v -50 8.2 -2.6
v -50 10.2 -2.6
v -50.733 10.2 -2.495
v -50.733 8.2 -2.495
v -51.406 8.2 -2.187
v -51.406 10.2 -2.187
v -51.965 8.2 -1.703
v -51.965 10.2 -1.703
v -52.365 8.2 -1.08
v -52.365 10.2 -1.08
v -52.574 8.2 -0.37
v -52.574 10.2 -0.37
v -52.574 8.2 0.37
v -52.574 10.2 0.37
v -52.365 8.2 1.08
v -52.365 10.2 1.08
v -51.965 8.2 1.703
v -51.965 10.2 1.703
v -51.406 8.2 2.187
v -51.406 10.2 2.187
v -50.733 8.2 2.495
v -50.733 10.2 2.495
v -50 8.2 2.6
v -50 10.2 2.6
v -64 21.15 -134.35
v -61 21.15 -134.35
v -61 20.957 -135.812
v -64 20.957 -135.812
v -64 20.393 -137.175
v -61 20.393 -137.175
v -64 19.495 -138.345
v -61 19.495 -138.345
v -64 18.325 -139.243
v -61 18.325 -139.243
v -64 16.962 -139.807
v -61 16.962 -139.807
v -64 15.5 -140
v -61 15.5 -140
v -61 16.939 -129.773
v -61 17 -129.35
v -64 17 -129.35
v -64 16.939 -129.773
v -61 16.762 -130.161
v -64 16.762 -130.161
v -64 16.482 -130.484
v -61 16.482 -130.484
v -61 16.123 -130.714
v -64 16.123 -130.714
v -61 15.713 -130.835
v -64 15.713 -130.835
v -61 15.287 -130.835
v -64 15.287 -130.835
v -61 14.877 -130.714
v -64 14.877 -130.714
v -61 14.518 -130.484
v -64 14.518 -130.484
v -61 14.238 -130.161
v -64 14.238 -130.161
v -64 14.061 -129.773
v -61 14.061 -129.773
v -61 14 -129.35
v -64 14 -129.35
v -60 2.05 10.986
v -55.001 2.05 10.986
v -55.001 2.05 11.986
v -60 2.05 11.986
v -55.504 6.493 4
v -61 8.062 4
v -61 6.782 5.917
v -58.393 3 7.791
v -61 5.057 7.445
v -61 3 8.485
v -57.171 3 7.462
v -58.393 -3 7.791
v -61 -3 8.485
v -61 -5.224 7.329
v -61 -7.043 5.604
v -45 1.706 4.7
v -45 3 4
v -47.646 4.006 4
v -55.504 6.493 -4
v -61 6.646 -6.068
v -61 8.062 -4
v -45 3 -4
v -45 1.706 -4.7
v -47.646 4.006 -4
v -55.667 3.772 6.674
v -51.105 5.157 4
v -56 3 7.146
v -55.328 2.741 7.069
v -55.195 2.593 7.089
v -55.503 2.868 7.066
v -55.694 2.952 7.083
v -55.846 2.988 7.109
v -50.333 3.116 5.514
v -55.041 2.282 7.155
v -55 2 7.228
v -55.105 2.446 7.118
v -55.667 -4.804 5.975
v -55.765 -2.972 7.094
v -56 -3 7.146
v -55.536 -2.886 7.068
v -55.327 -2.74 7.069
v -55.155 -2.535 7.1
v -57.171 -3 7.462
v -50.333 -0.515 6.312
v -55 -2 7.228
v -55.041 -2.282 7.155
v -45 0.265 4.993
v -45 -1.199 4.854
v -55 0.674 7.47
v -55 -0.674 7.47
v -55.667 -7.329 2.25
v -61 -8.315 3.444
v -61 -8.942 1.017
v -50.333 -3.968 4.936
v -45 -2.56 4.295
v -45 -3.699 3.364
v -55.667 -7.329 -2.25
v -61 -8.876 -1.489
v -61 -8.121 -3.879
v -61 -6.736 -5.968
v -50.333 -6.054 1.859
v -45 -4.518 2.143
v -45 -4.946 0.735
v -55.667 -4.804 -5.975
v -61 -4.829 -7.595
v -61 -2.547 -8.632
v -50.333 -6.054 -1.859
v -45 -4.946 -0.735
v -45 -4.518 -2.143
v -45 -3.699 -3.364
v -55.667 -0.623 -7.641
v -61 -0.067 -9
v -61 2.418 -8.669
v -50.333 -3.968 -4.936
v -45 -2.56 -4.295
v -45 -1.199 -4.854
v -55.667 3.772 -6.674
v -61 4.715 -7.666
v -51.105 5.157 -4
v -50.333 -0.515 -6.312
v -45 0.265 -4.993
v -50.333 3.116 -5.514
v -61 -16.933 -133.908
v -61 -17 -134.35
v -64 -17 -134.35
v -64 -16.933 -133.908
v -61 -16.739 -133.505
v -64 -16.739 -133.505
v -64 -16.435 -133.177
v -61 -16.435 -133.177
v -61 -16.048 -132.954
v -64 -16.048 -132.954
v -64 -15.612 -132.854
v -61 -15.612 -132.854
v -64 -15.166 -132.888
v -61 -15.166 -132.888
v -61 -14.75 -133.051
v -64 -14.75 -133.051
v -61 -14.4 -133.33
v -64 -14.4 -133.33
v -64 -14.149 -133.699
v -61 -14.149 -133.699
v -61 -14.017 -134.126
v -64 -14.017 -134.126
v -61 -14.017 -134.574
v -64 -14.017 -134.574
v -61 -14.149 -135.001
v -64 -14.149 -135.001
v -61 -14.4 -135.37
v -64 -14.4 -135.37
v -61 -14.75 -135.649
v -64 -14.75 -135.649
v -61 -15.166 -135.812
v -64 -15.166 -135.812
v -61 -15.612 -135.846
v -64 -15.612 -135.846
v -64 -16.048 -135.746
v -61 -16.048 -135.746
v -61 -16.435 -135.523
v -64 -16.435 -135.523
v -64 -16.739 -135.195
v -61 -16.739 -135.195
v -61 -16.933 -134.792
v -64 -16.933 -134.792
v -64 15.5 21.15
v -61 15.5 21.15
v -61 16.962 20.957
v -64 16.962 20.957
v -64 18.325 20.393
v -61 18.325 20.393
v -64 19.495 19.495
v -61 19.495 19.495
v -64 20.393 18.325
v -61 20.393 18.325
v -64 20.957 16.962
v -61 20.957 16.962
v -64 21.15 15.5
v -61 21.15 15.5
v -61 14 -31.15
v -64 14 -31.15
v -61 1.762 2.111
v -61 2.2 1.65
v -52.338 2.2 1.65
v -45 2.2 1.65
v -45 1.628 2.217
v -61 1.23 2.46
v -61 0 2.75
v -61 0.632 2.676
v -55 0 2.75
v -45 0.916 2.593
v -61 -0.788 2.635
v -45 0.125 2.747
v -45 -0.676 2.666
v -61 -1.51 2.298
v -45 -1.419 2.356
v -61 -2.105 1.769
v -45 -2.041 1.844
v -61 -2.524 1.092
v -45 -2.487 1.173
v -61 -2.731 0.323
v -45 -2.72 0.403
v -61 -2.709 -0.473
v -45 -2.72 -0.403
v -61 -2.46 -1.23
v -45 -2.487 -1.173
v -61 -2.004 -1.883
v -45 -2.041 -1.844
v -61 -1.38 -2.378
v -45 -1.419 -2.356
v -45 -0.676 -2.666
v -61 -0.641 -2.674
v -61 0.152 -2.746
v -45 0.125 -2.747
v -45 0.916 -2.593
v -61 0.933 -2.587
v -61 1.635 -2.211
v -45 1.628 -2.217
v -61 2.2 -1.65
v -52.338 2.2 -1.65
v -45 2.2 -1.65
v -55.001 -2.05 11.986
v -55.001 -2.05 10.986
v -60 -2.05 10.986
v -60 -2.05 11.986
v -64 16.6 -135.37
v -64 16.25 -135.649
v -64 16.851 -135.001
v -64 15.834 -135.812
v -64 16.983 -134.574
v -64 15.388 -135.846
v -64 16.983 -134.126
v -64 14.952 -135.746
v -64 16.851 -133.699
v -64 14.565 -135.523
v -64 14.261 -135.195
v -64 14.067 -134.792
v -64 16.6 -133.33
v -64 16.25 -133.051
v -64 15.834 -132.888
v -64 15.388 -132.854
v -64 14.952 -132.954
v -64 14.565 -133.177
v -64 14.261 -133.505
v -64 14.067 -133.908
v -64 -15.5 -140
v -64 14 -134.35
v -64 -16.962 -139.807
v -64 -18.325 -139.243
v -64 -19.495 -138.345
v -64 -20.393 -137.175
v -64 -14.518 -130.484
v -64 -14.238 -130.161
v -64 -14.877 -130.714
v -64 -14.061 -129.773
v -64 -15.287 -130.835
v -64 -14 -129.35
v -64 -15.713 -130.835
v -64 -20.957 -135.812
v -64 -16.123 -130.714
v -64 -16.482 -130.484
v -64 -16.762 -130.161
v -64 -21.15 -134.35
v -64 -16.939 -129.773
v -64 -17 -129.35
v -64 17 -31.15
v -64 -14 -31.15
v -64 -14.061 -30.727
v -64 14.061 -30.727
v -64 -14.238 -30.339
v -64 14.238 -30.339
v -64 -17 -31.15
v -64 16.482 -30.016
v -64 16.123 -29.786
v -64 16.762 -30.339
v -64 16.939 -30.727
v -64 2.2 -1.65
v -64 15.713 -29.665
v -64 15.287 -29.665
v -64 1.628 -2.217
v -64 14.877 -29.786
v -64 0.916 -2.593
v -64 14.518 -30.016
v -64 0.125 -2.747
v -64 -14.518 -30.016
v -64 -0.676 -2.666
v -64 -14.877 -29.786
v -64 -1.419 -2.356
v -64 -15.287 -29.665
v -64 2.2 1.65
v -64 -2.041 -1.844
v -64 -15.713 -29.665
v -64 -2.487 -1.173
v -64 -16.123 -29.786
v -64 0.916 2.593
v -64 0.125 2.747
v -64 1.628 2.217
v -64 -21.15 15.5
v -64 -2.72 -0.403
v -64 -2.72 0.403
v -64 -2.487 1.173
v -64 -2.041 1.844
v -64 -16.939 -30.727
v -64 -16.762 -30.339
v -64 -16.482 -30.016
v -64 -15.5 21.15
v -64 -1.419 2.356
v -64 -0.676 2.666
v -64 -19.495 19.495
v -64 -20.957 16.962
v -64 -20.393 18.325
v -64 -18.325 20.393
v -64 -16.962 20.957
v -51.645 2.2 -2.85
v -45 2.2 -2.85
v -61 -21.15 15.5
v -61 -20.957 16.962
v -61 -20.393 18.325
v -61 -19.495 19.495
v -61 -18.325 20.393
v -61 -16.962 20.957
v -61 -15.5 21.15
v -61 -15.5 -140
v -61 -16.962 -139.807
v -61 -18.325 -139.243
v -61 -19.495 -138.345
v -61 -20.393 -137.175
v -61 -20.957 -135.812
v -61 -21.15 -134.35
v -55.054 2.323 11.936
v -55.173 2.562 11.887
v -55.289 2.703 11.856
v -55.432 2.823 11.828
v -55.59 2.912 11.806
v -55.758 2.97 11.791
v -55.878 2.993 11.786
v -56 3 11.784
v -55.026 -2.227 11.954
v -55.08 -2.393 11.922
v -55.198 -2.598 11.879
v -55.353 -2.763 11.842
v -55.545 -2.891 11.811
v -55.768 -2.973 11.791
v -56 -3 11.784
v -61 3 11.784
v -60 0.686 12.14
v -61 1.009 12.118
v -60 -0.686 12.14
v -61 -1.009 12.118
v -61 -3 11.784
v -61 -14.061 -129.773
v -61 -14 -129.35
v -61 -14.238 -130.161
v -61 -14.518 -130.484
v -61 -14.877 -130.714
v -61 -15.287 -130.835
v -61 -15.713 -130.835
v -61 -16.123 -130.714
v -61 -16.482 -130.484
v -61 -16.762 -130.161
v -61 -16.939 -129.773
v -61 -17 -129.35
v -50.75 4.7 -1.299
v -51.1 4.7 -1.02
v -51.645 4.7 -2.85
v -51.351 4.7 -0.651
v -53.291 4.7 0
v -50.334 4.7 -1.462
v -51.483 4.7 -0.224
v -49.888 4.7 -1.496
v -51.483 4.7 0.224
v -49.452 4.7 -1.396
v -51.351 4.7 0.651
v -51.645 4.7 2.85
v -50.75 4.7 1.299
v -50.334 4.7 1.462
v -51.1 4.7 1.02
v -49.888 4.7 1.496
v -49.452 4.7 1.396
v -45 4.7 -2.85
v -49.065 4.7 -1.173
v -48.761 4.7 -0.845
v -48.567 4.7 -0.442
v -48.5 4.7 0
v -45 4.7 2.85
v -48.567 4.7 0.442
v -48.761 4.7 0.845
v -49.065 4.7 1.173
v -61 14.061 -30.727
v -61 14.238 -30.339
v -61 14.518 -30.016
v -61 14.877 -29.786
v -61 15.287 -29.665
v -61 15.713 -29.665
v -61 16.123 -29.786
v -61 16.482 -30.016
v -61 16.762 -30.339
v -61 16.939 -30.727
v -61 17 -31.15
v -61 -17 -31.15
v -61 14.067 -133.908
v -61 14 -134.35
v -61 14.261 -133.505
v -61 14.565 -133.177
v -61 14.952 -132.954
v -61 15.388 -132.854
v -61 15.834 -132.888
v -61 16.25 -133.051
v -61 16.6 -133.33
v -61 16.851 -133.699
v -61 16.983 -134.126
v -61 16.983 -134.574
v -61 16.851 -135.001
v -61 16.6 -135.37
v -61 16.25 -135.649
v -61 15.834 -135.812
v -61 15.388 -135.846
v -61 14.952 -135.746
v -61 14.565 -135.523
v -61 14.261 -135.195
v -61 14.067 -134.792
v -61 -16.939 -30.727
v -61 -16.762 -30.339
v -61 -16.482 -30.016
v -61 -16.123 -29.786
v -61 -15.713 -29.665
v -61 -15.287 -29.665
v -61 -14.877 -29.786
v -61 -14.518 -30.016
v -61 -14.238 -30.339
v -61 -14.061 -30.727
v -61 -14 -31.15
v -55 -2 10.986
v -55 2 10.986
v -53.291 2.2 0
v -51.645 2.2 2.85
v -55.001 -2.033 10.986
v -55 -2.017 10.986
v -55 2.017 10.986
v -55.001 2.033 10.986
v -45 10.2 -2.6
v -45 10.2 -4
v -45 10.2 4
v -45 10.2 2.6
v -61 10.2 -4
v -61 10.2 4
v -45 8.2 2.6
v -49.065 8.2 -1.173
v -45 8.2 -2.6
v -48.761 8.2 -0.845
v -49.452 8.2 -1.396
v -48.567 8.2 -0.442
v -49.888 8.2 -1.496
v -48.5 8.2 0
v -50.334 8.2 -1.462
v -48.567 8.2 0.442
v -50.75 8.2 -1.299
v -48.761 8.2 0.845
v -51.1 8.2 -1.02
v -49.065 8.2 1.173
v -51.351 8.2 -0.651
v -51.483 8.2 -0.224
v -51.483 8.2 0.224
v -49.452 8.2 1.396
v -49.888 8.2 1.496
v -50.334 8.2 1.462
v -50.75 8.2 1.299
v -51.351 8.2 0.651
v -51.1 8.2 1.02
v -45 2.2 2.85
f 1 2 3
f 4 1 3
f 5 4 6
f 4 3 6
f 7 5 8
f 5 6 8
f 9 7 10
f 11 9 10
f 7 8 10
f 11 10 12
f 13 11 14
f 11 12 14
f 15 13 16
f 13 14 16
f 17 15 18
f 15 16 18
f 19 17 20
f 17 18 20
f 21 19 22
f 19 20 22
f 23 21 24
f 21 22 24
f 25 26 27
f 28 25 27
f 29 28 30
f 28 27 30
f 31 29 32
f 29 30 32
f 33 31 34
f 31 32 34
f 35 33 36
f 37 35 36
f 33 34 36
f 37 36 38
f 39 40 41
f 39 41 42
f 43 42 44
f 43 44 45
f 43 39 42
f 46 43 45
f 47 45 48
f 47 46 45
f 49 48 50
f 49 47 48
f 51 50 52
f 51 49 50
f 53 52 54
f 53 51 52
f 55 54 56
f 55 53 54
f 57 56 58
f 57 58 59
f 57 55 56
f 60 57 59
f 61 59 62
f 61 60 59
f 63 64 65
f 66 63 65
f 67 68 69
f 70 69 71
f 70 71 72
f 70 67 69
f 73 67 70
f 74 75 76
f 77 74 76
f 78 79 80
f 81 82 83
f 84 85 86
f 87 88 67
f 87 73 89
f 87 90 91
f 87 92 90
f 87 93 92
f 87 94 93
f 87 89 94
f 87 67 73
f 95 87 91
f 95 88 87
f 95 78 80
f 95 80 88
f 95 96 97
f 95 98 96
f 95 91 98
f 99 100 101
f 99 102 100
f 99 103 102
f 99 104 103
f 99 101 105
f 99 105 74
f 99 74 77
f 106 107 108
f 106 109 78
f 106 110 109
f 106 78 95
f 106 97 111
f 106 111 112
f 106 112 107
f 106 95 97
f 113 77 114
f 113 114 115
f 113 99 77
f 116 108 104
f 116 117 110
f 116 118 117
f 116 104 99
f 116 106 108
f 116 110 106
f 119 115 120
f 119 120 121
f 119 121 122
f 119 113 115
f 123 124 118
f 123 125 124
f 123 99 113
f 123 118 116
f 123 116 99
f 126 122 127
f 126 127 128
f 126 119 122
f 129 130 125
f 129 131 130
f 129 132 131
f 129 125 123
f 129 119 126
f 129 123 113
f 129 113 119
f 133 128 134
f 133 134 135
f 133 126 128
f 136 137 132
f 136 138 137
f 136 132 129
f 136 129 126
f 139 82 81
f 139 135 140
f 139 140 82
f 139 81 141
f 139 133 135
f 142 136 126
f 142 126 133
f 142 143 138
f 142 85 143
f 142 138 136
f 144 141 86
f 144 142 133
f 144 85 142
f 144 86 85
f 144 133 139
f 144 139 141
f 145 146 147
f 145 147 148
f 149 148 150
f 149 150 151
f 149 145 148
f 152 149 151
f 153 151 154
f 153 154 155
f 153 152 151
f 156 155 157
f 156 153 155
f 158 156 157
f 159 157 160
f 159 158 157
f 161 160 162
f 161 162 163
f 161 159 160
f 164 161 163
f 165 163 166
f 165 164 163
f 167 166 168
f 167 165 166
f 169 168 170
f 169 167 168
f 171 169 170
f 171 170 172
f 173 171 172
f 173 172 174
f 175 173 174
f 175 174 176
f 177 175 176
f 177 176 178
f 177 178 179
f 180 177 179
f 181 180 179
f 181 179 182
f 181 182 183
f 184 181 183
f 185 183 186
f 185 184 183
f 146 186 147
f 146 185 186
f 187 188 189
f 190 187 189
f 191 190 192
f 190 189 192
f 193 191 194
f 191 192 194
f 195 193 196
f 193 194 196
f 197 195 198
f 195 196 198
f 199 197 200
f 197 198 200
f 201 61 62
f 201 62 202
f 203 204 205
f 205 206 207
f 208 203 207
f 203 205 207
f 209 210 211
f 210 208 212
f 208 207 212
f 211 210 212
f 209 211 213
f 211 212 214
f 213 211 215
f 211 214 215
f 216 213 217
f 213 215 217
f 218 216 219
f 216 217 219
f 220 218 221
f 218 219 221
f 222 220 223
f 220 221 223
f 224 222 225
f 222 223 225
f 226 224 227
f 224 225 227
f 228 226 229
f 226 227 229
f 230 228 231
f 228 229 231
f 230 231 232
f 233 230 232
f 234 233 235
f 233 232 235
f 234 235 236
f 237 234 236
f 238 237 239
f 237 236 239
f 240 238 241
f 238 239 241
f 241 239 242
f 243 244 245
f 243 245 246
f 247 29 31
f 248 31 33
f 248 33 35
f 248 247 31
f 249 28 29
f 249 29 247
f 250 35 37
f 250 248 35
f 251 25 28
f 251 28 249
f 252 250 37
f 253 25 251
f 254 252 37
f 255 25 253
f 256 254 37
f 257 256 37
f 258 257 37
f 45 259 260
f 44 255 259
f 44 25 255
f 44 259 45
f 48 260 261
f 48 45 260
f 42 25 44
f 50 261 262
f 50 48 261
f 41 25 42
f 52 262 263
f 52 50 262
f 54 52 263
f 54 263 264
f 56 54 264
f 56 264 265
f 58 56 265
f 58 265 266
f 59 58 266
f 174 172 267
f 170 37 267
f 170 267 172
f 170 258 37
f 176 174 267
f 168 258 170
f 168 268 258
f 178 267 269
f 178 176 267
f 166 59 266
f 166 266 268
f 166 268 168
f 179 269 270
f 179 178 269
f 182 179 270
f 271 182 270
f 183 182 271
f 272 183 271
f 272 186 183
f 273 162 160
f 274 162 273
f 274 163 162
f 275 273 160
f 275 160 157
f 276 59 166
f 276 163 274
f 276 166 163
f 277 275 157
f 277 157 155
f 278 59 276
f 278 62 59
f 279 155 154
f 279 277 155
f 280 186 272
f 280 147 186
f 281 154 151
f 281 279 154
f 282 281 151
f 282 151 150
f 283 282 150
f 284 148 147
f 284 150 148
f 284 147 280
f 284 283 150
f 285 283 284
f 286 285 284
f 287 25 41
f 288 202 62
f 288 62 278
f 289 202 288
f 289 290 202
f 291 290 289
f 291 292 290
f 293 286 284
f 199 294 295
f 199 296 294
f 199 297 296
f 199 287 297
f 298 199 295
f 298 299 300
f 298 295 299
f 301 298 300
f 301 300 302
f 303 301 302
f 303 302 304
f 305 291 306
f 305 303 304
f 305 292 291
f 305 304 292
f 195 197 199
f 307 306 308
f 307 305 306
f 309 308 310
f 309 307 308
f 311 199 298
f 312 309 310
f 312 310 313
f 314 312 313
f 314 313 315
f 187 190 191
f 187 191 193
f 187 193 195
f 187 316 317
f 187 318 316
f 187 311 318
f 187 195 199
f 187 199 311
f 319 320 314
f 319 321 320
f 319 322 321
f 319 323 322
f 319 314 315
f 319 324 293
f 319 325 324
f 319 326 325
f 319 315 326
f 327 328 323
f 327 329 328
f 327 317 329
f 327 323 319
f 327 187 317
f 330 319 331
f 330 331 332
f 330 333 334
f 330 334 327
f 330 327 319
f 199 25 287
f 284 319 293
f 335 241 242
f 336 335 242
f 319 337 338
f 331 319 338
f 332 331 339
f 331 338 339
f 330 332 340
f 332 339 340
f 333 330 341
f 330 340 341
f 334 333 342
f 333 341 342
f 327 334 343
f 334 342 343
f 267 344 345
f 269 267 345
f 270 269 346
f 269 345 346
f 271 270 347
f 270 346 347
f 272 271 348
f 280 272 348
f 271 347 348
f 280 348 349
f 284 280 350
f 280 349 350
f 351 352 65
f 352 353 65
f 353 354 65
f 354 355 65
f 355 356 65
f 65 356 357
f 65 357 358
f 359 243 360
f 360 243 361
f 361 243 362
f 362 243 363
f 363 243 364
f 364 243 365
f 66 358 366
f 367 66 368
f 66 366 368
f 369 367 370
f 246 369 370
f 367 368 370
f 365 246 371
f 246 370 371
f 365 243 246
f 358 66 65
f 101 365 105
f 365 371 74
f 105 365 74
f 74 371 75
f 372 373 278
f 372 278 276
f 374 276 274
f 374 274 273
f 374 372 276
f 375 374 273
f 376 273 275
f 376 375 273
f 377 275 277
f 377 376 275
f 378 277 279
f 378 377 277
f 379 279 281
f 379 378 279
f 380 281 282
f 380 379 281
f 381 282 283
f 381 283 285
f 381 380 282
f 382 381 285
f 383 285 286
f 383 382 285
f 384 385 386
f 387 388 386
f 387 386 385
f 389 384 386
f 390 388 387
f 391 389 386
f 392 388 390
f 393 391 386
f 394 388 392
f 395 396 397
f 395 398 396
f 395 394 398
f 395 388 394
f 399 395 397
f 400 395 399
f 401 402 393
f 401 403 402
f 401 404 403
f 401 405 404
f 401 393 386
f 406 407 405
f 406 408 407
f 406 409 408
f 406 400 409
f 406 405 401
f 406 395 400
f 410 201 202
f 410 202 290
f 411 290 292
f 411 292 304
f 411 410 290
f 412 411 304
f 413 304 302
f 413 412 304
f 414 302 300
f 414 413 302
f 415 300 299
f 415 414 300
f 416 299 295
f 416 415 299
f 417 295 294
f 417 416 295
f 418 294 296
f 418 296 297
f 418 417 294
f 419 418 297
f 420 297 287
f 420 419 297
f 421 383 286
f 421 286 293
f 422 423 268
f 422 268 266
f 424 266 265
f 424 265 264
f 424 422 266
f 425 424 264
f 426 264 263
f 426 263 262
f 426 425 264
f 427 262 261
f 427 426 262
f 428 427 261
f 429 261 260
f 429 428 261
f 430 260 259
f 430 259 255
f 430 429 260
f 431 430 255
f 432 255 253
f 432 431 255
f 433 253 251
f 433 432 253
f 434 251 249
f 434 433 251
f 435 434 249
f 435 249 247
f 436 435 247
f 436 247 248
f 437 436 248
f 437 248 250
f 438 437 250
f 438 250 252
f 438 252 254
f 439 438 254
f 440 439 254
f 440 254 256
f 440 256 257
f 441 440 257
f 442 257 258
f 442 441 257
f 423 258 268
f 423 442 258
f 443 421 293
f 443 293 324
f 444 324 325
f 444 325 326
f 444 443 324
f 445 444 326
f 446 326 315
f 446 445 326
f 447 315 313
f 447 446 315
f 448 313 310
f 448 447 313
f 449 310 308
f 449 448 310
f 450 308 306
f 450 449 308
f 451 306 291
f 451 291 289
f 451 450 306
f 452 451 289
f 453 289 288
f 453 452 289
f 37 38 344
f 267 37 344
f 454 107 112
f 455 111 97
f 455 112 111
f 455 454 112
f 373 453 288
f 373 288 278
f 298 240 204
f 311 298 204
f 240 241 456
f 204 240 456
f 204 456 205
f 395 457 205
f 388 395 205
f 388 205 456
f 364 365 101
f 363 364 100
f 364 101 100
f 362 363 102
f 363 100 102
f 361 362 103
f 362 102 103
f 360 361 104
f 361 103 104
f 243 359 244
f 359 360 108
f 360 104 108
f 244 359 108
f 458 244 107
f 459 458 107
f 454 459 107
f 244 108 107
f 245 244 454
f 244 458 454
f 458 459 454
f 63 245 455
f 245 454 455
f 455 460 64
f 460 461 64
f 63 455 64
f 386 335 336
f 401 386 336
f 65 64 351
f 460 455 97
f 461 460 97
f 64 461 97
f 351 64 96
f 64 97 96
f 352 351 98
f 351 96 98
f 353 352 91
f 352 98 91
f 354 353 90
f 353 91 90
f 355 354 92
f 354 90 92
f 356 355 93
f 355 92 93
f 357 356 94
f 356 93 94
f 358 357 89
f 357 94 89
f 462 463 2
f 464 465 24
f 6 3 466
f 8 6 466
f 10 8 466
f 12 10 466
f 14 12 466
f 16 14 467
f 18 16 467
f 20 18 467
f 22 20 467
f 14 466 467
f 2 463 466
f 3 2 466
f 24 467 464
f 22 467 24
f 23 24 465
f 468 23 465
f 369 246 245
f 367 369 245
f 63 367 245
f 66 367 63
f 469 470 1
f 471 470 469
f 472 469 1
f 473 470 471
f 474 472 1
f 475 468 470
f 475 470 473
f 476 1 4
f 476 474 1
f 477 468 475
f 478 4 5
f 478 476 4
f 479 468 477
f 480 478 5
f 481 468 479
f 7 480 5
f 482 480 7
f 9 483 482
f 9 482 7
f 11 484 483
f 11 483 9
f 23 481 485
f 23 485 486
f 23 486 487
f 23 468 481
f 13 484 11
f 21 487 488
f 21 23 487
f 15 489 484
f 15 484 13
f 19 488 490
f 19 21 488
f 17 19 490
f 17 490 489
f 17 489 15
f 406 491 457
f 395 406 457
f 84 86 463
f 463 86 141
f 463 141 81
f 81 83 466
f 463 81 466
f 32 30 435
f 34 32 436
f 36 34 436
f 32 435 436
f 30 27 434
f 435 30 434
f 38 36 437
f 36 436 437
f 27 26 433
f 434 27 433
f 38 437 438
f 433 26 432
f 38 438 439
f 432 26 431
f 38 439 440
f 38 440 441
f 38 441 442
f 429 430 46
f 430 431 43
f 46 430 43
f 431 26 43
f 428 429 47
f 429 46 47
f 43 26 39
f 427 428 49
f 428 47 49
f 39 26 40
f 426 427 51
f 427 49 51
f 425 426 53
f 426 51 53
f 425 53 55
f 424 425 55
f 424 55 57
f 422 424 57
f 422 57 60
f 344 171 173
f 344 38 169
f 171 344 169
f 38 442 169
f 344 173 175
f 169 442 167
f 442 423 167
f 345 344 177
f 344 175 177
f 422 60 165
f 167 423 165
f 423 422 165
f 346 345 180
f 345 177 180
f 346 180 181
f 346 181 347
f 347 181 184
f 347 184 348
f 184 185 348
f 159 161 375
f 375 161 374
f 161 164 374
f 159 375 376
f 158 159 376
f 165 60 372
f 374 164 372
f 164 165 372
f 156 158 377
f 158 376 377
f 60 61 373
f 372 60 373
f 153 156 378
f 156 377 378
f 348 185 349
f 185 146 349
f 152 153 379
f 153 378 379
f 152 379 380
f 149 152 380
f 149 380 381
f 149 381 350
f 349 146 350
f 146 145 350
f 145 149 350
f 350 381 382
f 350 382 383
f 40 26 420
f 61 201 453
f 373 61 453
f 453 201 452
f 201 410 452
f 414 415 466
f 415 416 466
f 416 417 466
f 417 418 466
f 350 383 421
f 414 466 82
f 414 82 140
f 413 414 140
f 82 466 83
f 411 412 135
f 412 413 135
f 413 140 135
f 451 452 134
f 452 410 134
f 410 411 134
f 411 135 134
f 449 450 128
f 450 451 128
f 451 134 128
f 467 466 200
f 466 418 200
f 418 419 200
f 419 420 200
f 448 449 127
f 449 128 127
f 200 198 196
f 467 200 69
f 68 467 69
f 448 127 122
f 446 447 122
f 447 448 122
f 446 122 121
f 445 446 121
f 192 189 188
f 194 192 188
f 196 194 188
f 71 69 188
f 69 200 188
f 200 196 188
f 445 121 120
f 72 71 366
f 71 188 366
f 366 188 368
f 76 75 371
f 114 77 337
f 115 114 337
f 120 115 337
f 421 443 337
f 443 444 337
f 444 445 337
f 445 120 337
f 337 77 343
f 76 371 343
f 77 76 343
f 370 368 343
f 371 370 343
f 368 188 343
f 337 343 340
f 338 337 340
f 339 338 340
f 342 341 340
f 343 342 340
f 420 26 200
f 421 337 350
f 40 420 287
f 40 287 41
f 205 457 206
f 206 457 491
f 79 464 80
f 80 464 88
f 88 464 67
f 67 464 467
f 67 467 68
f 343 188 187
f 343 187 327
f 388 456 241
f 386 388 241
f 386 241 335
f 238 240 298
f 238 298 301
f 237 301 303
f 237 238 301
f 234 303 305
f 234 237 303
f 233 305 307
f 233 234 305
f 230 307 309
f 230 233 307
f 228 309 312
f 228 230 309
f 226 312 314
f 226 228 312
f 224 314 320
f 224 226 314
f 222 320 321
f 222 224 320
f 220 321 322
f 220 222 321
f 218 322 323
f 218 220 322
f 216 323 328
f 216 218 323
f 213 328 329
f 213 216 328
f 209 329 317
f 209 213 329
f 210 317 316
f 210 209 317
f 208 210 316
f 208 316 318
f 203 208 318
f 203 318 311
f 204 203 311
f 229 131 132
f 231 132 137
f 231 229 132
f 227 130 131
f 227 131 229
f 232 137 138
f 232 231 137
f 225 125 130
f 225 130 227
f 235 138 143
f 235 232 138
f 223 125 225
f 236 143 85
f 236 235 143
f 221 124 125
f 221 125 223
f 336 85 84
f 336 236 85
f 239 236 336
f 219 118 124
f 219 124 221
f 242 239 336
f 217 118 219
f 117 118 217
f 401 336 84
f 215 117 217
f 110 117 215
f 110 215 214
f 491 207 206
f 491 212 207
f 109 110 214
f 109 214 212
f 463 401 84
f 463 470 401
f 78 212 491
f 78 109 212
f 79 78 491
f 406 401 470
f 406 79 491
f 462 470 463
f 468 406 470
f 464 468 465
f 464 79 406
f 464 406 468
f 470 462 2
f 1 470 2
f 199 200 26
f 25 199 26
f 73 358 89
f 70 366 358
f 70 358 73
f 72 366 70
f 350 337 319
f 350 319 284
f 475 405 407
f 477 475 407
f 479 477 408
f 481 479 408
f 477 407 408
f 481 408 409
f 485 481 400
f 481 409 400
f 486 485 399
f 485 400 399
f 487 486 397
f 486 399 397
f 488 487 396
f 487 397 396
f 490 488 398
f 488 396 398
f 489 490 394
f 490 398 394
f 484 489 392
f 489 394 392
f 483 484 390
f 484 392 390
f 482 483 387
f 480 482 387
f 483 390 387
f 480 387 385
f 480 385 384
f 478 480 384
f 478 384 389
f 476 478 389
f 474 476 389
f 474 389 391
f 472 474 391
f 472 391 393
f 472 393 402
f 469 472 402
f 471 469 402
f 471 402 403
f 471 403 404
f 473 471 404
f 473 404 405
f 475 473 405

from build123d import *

# Parameters (mm, degrees)
SKETCH028_R     = 1.5
PAD012_DEPTH    = 3
SKETCH029_R     = 9
SKETCH030_R     = 5
PAD018_DEPTH    = 6
POCKET002_DEPTH = 5
FILLET001_R     = 1
SKETCH052_W     = 8
SKETCH052_H     = 8
SKETCH051_W     = 8
SKETCH051_H     = 8
SKETCH053_R     = 1.5
POCKET003_DEPTH = 15
POCKET004_DEPTH = 2.5
POCKET005_DEPTH = 2


with BuildPart() as part:
    # Sketch028 (on Face1 of Binder008) → Pad012 (new body)
    with BuildSketch(Plane(origin=(-61, 0, 0), x_dir=(0, -1, 0), z_dir=(-1, 0, 0))):
        with BuildLine():
            Line((-21.15, 15.5), (-21.15, -134.35))
            ThreePointArc((-21.15, -134.35), (-19.495153, -138.345153), (-15.5, -140))
            Line((-15.5, -140), (15.5, -140))
            ThreePointArc((15.5, -140), (19.495153, -138.345153), (21.15, -134.35))
            Line((21.15, 15.5), (21.15, -134.35))
            ThreePointArc((21.15, 15.5), (19.495153, 19.495153), (15.5, 21.15))
            Line((-15.5, 21.15), (15.5, 21.15))
            ThreePointArc((-15.5, 21.15), (-19.495153, 19.495153), (-21.15, 15.5))
        make_face()
        with Locations((15.5, -134.35)):
            Circle(SKETCH028_R, mode=Mode.SUBTRACT)
        with Locations((-15.5, -134.35)):
            Circle(SKETCH028_R, mode=Mode.SUBTRACT)
        with BuildLine():
            ThreePointArc((17, -31.15), (15.5, -29.65), (14, -31.15))
            Line((14, -31.15), (14, -129.35))
            ThreePointArc((14, -129.35), (15.5, -130.85), (17, -129.35))
            Line((17, -129.35), (17, -31.15))
        make_face(mode=Mode.SUBTRACT)
        with BuildLine():
            ThreePointArc((-14, -31.15), (-15.5, -29.65), (-17, -31.15))
            Line((-17, -31.15), (-17, -129.35))
            ThreePointArc((-17, -129.35), (-15.5, -130.85), (-14, -129.35))
            Line((-14, -129.35), (-14, -31.15))
        make_face(mode=Mode.SUBTRACT)
        with BuildLine():
            ThreePointArc((-2.2, -1.65), (2.75, 0), (-2.2, 1.65))
            Line((-2.2, 1.65), (-2.2, -1.65))
        make_face(mode=Mode.SUBTRACT)
    extrude(amount=PAD012_DEPTH)

    # Sketch029 (on Face21 of Pad012) → AdditiveLoft002 section 0
    with BuildSketch(Plane.YZ.offset(-61)):
        Circle(SKETCH029_R)
    # Sketch030 (on Face21 of Pad012) → AdditiveLoft002 section 1
    with BuildSketch(Plane.YZ.offset(-45)):
        Circle(SKETCH030_R)
    loft()

    # Sketch033 (on Face21 of Pad012) → SubtractiveLoft section 0
    with BuildSketch(Plane.YZ.offset(-61)):
        with BuildLine():
            ThreePointArc((2.2, 1.65), (-2.75, 0), (2.2, -1.65))
            Line((2.2, 1.65), (2.2, -1.65))
        make_face()
    # Sketch032 (on Binder) → SubtractiveLoft section 1
    with BuildSketch(Plane.YZ.offset(-45)):
        with BuildLine():
            ThreePointArc((2.2, 1.65), (-2.75, 0), (2.2, -1.65))
            Line((2.2, 1.65), (2.2, -1.65))
        make_face()
    loft(mode=Mode.SUBTRACT)

    # Sketch041 (on Face4 of SubtractiveLoft) → Pad018 (join)
    with BuildSketch(Plane.YZ.offset(-61)):
        with BuildLine():
            ThreePointArc((3, 11.783809), (0, 12.159693), (-3, 11.783809))
            Line((-3, 11.783809), (-3, 2.75))
            Line((-3, 2.75), (3, 2.75))
            Line((3, 11.783809), (3, 2.75))
        make_face()
    extrude(amount=PAD018_DEPTH)

    # Sketch042 (on Face28 of Pad018) → Pocket002 (cut)
    with BuildSketch(Plane.YZ.offset(-55)):
        with BuildLine():
            Line((-2.05, 10.985643), (2.05, 10.985643))
            Line((2.05, 10.985643), (2.05, 11.985643))
            ThreePointArc((2.05, 11.985643), (0, 12.159693), (-2.05, 11.985643))
            Line((-2.05, 10.985643), (-2.05, 11.985643))
        make_face()
    extrude(amount=-POCKET002_DEPTH, mode=Mode.SUBTRACT)

    # Fillet001
    fillet001_edges = [part.edges().sort_by_distance(p)[0] for p in [
        (-55, -3, 9.328836),
        (-55, 3, 9.328836),
    ]]
    fillet(fillet001_edges, radius=FILLET001_R)

    # Sketch052 (on Face7 of Fillet001) → AdditiveLoft003 section 0
    with BuildSketch(Plane.YZ.offset(-45)):
        with Locations((6.2, 0)):
            Rectangle(SKETCH052_W, SKETCH052_H)
    # Sketch051 (on Face4 of Fillet001) → AdditiveLoft003 section 1
    with BuildSketch(Plane.YZ.offset(-61)):
        with Locations((6.2, 0)):
            Rectangle(SKETCH051_W, SKETCH051_H)
    loft()

    # Sketch053 (on Face39 of AdditiveLoft003) → Pocket003 (cut)
    with BuildSketch(Plane.XZ.offset(-2.2)):
        with Locations((-50, 0)):
            Circle(SKETCH053_R)
    extrude(amount=-POCKET003_DEPTH, mode=Mode.SUBTRACT)

    # Sketch054 (on Face40 of Pocket003) → Pocket004 (cut)
    with BuildSketch(Plane.XZ.offset(-2.2)):
        Polygon((-51.645448, 2.85), (-53.290897, 0), (-51.645448, -2.85), (-48.354552, -2.85), (-45, -2.85), (-45, 2.85), (-48.354552, 2.85), align=None)
    extrude(amount=-POCKET004_DEPTH, mode=Mode.SUBTRACT)

    # Sketch055 (on Face33 of Pocket004) → Pocket005 (cut)
    with BuildSketch(Plane(origin=(0, 10.2, 0), x_dir=(-1, 0, 0), z_dir=(0, 1, 0))):
        with BuildLine():
            ThreePointArc((50, -2.6), (52.6, 0), (50, 2.6))
            Line((50, 2.6), (45, 2.6))
            Line((45, 2.6), (45, -2.6))
            Line((45, -2.6), (50, -2.6))
        make_face()
    extrude(amount=-POCKET005_DEPTH, mode=Mode.SUBTRACT)


solid = part.part
